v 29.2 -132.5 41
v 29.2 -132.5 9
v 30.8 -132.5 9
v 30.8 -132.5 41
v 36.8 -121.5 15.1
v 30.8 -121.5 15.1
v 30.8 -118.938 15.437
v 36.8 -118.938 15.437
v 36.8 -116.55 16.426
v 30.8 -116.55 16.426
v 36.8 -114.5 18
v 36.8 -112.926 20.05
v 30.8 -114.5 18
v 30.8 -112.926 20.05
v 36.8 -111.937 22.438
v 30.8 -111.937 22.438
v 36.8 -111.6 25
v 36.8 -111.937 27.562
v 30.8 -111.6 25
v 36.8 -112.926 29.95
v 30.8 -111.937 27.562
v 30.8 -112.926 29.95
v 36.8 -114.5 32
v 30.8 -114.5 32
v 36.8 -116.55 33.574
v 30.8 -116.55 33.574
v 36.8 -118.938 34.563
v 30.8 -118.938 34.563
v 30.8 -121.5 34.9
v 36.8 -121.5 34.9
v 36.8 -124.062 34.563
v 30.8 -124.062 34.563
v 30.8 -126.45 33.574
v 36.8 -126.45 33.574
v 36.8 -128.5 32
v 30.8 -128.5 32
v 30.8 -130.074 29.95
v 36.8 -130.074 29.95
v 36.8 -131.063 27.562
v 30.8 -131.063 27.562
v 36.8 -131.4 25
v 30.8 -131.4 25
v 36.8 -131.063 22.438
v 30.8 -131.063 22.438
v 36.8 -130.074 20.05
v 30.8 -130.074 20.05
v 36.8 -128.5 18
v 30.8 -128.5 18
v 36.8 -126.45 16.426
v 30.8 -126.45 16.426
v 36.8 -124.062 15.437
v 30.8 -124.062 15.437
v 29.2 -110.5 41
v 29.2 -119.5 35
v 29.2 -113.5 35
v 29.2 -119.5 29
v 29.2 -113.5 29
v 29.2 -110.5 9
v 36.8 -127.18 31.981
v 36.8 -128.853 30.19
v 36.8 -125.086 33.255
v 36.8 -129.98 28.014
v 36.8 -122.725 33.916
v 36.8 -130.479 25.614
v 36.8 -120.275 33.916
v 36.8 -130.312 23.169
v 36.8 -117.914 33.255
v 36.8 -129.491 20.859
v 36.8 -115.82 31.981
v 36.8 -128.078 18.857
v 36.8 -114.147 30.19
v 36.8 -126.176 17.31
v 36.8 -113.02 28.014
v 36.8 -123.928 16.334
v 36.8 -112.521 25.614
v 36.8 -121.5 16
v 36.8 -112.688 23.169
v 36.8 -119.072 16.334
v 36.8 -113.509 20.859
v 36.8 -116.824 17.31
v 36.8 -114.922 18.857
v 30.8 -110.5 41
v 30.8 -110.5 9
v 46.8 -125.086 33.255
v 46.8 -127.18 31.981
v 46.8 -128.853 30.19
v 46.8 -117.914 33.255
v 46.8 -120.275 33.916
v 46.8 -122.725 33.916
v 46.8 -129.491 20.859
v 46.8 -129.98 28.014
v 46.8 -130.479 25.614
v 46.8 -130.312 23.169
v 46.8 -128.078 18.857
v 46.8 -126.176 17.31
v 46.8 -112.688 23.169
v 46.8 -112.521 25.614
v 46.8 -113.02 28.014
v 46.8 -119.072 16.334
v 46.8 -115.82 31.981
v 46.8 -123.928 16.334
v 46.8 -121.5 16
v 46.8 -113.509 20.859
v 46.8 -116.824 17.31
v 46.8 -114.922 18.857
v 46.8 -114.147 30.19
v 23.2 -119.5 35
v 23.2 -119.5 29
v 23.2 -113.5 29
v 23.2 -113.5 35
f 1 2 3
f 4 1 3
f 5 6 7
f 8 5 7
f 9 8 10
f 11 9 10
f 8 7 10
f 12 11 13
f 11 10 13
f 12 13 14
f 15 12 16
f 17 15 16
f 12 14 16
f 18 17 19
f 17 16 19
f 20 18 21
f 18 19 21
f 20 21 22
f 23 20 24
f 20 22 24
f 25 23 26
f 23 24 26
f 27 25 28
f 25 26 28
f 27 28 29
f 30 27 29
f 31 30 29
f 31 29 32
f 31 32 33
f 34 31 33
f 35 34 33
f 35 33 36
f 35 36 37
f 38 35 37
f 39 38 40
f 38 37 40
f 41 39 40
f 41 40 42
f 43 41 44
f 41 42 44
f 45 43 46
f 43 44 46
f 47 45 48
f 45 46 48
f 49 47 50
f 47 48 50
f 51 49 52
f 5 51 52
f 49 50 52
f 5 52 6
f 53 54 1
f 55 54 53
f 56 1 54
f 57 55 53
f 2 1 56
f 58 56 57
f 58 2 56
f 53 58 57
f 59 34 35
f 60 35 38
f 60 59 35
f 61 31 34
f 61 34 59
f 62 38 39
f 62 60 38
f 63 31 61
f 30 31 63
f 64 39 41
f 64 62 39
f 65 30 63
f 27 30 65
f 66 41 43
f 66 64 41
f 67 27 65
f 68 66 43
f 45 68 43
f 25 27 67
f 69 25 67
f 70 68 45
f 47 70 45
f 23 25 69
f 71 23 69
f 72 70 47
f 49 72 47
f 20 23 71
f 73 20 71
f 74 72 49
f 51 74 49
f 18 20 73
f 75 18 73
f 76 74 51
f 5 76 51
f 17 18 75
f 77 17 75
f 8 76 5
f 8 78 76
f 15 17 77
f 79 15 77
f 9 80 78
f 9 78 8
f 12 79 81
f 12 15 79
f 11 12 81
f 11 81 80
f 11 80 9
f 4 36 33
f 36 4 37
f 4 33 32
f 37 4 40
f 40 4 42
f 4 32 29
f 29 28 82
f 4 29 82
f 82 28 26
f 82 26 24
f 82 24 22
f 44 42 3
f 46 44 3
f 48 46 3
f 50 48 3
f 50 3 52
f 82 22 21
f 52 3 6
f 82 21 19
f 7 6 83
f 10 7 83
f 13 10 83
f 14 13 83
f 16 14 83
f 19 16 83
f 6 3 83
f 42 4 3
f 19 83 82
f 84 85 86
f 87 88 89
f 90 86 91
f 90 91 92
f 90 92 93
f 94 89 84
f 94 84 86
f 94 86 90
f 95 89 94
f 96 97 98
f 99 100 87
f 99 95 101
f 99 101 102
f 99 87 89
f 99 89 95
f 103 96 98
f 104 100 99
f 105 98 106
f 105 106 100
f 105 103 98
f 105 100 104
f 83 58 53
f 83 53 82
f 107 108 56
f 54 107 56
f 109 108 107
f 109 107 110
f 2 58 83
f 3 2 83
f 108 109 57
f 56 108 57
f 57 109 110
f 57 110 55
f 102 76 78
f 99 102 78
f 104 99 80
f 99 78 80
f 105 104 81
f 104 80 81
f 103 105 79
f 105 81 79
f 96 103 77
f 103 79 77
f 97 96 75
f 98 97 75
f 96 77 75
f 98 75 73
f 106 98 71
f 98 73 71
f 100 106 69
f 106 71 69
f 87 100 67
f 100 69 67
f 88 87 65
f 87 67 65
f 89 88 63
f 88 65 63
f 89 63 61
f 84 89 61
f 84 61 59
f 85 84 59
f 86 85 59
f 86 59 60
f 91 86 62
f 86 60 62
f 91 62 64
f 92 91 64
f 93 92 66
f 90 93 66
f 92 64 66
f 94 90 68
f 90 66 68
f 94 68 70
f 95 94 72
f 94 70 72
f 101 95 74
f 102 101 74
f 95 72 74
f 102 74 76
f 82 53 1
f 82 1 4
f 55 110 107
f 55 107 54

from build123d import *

# Parameters (mm, degrees)
SKETCH1_W           = 1.6
SKETCH1_H           = 22
BOSS_EXTRUDE1_DEPTH = 32
SKETCH2_R           = 9.9
BOSS_EXTRUDE2_DEPTH = 6
SKETCH3_R           = 9
BOSS_EXTRUDE3_DEPTH = 10
SKETCH4_W           = 6
SKETCH4_H           = 6
BOSS_EXTRUDE4_DEPTH = 6


with BuildPart() as part:
    # Sketch1 → Boss-Extrude1 (new body)
    with BuildSketch(Plane.XY.offset(9)):
        with Locations((30, -121.5)):
            Rectangle(SKETCH1_W, SKETCH1_H)
    extrude(amount=BOSS_EXTRUDE1_DEPTH)

    # Sketch2 → Boss-Extrude2 (add)
    with BuildSketch(Plane(origin=(30.8, 0, 0), x_dir=(0, 0, -1), z_dir=(1, 0, 0))):
        with Locations((-25, -121.5)):
            Circle(SKETCH2_R)
    extrude(amount=BOSS_EXTRUDE2_DEPTH)

    # Sketch3 → Boss-Extrude3 (add)
    with BuildSketch(Plane(origin=(36.8, 0, 0), x_dir=(0, 0, -1), z_dir=(1, 0, 0))):
        with Locations((-25, -121.5)):
            Circle(SKETCH3_R)
    extrude(amount=BOSS_EXTRUDE3_DEPTH)

    # Sketch4 → Boss-Extrude4 (add)
    with BuildSketch(Plane.XY.offset(29)):
        with Locations((26.2, -116.5)):
            Rectangle(SKETCH4_W, SKETCH4_H)
    extrude(amount=BOSS_EXTRUDE4_DEPTH)


solid = part.part
